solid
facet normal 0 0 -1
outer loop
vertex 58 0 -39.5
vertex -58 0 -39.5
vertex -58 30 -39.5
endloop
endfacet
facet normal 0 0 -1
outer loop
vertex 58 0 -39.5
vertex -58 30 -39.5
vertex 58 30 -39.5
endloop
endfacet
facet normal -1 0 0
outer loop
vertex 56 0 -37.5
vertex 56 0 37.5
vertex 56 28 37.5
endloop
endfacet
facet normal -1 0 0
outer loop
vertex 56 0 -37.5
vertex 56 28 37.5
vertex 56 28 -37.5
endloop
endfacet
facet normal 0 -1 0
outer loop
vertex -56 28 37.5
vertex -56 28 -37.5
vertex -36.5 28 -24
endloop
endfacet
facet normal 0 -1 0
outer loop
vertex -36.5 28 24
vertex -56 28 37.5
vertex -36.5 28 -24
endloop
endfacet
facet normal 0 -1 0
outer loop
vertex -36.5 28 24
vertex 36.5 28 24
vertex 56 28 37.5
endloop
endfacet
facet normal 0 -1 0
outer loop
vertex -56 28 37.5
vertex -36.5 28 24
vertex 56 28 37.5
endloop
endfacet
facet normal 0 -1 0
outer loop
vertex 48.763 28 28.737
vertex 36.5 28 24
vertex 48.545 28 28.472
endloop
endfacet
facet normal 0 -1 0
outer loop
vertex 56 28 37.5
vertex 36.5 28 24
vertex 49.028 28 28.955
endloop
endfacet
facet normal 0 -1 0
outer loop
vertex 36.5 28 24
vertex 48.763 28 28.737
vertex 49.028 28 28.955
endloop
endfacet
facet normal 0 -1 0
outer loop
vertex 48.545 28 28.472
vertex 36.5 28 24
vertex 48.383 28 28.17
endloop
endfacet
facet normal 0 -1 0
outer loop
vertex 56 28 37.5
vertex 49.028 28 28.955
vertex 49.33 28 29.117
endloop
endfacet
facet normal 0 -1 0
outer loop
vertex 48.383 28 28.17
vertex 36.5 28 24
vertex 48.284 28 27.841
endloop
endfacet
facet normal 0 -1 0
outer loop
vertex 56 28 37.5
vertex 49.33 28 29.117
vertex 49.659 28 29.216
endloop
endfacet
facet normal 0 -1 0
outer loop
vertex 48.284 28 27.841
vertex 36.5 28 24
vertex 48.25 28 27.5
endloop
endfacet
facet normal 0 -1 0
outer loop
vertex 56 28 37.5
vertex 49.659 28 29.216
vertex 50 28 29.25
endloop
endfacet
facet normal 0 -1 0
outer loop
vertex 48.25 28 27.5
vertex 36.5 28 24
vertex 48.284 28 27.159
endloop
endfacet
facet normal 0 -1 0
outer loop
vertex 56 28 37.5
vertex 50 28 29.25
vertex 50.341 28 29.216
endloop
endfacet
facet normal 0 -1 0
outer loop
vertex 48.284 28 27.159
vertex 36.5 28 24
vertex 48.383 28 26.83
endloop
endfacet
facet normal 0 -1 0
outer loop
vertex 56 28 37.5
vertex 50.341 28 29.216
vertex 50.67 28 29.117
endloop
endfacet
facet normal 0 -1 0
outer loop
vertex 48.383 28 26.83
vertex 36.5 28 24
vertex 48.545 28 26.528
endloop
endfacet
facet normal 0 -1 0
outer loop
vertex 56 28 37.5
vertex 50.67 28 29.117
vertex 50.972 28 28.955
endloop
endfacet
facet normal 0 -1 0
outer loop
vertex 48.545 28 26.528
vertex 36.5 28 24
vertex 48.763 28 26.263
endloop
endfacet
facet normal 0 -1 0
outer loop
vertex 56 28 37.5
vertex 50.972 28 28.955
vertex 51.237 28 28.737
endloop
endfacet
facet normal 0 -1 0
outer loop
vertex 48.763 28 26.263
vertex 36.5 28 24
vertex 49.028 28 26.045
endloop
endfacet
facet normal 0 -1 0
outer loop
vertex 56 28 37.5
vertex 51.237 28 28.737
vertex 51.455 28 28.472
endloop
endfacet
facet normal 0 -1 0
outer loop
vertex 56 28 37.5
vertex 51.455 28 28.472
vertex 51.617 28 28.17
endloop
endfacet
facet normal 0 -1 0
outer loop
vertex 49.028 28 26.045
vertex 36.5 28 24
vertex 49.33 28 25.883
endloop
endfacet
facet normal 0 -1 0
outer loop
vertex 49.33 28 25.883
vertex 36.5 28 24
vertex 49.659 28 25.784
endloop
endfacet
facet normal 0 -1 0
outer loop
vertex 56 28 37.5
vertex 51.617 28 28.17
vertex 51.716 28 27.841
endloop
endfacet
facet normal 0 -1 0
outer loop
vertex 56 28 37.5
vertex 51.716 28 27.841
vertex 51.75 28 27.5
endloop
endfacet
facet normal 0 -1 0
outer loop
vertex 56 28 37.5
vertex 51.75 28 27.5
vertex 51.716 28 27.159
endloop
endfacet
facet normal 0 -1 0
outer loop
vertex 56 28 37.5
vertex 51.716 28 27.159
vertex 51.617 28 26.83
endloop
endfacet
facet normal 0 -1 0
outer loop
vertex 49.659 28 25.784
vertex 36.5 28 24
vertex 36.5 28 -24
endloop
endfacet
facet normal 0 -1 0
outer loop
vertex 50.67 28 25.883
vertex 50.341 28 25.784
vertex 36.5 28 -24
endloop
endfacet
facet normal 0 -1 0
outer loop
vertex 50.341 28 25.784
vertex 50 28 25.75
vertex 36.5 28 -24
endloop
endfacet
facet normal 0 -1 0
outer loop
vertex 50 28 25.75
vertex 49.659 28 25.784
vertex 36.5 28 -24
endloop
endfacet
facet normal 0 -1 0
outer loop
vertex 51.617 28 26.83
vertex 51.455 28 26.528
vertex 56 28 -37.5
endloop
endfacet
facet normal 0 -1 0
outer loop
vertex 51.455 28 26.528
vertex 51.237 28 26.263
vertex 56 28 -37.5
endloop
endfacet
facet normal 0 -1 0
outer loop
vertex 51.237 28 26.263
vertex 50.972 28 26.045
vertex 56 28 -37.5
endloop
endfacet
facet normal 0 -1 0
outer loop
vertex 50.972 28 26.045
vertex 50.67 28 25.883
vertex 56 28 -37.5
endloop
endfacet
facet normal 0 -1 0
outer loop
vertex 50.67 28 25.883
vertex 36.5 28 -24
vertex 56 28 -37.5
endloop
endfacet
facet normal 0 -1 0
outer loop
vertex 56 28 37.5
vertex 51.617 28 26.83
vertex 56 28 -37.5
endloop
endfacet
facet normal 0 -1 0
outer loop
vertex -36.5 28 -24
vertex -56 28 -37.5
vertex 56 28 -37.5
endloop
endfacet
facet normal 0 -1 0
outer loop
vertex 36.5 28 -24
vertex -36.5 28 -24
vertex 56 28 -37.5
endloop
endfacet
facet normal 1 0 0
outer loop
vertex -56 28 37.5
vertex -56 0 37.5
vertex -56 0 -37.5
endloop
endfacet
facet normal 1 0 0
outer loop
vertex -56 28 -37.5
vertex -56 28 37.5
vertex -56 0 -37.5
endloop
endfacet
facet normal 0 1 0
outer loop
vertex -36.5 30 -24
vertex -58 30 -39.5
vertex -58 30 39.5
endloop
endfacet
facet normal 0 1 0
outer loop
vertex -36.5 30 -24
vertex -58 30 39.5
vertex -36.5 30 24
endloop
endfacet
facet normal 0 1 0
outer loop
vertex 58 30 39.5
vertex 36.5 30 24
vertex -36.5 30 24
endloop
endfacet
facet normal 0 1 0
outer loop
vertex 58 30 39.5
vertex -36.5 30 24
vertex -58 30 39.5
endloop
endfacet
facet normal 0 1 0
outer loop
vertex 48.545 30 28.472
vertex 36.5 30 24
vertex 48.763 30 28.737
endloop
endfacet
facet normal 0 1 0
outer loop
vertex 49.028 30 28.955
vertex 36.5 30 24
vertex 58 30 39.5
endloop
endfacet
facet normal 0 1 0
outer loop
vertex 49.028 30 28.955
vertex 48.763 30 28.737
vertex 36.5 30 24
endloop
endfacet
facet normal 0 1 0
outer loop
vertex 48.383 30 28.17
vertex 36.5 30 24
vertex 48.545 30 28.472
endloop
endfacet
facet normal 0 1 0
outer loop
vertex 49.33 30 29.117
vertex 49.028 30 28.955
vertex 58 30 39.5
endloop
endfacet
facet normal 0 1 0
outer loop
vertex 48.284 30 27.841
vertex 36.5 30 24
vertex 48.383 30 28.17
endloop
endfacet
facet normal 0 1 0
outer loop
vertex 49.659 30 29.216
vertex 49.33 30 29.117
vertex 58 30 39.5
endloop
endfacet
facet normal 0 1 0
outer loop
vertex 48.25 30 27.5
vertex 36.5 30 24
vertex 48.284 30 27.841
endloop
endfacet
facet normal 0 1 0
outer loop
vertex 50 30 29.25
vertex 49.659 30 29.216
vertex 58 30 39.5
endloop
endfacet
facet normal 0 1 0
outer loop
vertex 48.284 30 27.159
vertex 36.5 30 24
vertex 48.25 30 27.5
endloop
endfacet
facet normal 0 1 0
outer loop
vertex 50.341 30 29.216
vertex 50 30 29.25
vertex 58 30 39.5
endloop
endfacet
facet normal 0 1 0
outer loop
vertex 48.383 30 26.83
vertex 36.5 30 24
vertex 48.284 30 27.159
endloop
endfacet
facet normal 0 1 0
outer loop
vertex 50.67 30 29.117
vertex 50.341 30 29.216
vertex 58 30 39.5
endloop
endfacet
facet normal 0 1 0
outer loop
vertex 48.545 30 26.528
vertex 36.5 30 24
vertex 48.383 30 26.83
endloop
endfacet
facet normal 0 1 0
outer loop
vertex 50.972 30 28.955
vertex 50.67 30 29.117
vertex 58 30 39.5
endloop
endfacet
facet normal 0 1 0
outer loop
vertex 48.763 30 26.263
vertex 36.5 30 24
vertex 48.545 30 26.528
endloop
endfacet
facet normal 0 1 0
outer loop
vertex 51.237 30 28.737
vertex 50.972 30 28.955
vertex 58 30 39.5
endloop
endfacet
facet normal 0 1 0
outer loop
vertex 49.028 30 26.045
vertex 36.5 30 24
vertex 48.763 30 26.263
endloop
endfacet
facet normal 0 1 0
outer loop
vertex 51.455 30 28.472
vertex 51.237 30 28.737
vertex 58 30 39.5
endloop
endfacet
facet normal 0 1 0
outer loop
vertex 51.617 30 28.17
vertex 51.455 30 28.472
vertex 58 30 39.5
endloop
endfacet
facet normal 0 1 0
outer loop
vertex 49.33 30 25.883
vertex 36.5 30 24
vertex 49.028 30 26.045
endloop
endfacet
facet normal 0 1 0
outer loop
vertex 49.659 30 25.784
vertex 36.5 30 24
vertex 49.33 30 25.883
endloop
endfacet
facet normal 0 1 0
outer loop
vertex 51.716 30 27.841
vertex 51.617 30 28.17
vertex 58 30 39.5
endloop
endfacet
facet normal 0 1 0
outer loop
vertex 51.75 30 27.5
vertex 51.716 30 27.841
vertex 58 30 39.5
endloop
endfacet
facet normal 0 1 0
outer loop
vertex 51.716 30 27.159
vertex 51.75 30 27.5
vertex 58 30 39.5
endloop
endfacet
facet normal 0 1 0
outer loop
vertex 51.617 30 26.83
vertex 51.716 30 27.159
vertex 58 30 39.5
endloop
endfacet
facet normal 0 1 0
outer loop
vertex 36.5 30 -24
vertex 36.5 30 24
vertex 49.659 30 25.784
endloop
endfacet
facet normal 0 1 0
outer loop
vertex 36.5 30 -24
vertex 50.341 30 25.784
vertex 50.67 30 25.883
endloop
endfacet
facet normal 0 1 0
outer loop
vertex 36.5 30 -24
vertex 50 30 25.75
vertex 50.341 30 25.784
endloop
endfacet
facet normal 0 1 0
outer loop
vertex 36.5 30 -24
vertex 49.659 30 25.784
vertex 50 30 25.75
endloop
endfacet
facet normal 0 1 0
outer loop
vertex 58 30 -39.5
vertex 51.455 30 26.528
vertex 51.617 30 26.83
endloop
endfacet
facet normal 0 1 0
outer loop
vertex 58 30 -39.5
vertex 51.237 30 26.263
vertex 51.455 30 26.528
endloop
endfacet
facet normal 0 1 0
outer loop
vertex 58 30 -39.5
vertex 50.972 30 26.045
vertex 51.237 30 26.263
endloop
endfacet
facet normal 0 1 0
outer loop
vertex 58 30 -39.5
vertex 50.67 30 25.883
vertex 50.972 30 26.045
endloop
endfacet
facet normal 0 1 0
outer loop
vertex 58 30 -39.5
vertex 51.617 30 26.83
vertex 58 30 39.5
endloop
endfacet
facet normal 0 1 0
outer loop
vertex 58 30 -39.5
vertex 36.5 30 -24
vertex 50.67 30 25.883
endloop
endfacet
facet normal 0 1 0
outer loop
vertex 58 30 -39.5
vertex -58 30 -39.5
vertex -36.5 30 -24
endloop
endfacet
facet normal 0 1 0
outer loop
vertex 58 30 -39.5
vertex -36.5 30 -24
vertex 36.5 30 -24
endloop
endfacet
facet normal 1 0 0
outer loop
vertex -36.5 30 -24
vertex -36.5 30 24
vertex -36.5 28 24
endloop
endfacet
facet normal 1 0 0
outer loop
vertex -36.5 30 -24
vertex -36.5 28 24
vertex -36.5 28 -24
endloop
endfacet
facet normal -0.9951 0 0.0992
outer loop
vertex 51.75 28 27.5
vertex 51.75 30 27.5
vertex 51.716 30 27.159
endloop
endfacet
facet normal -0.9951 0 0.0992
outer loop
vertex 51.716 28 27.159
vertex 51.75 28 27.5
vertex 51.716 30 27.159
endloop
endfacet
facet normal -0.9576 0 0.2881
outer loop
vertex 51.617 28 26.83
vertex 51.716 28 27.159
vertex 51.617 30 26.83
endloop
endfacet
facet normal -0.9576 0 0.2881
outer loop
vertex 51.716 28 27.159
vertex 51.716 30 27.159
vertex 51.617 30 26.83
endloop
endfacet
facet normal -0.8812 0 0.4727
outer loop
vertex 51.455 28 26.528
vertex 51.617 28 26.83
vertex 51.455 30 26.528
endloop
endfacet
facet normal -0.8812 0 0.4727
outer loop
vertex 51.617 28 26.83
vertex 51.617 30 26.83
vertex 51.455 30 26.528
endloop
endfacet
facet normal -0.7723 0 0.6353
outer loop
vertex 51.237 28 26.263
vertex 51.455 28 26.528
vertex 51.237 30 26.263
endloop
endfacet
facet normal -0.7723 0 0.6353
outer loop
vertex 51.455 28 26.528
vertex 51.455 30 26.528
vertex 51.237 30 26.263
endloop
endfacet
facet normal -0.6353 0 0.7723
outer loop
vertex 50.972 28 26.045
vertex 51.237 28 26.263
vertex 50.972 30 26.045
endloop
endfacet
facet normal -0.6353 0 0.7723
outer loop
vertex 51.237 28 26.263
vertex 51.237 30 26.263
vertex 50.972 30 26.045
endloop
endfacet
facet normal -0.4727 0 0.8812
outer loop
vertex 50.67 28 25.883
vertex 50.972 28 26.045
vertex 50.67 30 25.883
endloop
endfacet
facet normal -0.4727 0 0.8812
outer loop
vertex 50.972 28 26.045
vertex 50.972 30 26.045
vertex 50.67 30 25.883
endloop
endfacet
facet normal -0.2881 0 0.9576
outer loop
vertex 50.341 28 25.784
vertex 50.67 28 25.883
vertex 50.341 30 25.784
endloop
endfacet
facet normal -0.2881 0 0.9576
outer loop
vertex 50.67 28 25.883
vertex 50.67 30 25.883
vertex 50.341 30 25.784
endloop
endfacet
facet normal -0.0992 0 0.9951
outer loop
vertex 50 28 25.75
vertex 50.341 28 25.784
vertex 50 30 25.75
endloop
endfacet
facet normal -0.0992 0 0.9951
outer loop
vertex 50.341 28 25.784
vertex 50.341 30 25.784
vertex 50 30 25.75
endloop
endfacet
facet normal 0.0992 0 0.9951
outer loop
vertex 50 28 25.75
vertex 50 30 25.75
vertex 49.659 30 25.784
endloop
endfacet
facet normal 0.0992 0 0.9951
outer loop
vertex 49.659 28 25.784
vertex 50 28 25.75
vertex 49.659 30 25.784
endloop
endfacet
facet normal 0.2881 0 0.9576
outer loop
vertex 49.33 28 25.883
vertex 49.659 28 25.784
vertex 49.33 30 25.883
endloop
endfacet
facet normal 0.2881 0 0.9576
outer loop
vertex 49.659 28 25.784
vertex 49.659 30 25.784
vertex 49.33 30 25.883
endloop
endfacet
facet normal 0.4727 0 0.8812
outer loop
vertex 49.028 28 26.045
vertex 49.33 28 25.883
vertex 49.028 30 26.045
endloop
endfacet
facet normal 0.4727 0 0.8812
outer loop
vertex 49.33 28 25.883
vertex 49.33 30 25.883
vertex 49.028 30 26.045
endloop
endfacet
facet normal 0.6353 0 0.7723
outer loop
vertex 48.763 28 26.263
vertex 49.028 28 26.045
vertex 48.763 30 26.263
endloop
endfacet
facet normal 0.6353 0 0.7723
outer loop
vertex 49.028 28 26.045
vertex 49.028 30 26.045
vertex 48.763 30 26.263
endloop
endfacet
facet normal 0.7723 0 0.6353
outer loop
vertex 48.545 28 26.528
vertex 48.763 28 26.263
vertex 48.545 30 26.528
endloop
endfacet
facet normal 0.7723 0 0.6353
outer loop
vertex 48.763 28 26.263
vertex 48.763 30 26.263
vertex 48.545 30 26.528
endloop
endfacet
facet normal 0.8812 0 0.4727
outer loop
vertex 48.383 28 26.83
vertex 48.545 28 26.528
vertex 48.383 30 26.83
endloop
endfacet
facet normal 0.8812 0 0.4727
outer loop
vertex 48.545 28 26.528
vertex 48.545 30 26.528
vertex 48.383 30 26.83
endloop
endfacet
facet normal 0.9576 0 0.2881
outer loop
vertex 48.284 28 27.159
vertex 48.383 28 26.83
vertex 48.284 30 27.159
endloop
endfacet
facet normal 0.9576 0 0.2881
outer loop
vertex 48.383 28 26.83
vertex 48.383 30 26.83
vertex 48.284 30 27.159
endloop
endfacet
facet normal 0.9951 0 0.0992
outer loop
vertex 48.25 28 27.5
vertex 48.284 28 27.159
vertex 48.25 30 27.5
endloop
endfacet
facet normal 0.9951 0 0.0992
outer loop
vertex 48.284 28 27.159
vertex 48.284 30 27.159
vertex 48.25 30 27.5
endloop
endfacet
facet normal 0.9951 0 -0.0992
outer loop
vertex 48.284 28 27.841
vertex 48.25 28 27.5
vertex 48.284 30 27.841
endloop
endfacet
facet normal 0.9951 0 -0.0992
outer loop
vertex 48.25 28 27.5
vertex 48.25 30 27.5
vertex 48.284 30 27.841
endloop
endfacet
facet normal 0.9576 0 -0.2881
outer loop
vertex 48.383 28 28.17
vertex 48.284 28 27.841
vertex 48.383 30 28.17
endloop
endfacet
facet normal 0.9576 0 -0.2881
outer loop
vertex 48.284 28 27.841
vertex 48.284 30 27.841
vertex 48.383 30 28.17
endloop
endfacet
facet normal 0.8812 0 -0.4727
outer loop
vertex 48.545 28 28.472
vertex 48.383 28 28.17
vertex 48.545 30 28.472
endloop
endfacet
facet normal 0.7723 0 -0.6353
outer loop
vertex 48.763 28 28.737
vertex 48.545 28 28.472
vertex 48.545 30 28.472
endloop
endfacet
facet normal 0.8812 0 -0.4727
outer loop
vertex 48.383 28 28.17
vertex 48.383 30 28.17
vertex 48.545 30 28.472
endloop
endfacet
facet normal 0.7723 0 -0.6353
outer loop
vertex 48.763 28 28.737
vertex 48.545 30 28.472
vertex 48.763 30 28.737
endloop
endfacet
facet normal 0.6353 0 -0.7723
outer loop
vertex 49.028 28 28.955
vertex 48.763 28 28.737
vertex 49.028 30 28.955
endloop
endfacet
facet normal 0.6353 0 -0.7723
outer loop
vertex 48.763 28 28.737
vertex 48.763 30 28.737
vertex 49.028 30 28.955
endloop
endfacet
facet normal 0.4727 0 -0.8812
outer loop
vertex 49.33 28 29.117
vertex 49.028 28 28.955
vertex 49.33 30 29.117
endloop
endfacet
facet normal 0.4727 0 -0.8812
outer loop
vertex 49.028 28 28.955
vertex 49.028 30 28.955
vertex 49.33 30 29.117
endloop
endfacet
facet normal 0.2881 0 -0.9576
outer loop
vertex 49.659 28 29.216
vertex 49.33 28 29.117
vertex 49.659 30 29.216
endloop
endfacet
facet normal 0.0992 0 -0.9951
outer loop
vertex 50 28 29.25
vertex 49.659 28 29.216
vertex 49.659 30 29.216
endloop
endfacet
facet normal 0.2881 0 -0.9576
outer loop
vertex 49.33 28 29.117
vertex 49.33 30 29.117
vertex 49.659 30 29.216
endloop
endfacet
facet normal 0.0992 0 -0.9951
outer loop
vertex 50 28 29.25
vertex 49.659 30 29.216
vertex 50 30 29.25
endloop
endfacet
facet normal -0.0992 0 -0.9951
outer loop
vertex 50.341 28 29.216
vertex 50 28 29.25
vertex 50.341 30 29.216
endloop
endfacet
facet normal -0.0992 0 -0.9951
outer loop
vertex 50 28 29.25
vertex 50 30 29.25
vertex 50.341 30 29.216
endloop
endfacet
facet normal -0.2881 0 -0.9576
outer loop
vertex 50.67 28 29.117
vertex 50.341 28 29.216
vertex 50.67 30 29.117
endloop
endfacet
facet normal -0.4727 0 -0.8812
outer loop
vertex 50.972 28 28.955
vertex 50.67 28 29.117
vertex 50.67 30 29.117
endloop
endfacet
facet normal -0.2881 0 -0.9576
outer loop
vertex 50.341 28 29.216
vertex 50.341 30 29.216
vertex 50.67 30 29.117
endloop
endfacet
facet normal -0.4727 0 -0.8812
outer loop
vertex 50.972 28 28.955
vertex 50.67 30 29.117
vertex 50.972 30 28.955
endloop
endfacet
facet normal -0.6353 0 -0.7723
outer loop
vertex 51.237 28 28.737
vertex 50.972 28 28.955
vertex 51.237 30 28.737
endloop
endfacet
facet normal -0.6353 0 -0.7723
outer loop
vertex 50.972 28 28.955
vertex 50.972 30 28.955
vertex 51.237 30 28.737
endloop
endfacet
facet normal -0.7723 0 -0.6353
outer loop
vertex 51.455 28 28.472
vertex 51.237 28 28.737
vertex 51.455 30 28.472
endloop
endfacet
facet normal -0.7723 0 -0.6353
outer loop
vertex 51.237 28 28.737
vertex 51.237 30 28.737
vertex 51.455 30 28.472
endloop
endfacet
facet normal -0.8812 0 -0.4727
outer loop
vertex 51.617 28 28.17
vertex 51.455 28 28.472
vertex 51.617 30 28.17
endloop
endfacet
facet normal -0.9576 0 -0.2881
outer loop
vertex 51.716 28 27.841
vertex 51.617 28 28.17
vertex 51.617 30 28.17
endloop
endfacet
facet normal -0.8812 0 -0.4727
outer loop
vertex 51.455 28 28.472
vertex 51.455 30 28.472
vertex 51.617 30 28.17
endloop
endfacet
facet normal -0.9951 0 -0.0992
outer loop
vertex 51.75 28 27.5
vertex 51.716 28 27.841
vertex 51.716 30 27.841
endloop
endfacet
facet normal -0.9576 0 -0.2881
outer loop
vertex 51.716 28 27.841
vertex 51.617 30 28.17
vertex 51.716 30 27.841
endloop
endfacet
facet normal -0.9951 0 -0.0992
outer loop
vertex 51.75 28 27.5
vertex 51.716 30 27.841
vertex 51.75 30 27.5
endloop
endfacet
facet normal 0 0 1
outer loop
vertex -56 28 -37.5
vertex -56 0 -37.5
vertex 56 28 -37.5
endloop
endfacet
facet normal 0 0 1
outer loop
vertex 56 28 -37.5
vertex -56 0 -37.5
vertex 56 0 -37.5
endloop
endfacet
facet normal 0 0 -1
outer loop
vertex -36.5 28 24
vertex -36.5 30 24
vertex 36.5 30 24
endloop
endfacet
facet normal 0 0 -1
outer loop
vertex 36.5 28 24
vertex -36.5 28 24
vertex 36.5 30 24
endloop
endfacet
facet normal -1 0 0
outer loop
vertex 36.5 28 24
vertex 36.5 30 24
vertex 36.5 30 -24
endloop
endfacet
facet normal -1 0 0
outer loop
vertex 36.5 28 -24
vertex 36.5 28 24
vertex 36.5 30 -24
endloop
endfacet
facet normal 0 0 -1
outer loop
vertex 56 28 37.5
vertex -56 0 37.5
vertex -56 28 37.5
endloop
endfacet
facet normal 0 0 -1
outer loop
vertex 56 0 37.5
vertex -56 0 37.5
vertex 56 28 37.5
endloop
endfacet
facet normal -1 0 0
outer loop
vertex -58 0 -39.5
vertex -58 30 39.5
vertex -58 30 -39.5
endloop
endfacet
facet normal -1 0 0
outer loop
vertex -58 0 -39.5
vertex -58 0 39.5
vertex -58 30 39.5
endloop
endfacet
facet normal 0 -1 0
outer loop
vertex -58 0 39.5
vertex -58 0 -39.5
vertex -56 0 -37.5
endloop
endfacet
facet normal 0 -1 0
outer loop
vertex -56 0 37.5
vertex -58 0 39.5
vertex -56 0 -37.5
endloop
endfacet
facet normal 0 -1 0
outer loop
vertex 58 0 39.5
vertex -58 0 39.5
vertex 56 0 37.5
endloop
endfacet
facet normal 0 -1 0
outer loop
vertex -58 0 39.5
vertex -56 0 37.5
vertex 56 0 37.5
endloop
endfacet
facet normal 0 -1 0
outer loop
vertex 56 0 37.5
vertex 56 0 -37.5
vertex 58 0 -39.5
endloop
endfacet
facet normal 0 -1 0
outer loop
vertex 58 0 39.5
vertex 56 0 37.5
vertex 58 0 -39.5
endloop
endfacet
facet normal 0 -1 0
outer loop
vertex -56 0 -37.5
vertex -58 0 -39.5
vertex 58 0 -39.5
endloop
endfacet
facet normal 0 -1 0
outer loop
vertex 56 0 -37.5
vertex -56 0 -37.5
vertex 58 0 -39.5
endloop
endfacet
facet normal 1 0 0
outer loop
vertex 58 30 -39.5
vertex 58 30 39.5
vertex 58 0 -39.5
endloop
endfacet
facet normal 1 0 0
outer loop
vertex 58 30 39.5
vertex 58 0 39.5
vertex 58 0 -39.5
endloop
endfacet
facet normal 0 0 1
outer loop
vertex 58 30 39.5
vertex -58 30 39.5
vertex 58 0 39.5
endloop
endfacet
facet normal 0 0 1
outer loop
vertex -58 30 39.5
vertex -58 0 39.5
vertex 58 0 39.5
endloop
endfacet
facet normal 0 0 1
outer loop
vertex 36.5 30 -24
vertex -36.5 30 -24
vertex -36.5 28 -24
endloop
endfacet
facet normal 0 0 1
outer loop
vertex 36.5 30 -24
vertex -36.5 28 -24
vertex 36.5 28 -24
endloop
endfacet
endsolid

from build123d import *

# Parameters (mm, degrees)
SKETCH1_W           = 116
SKETCH1_H           = 79
SKETCH1_W_2         = 112
SKETCH1_H_2         = 75
BOSS_EXTRUDE1_DEPTH = 28
SKETCH2_W           = 116
SKETCH2_H           = 79
BOSS_EXTRUDE2_DEPTH = 2
SKETCH3_W           = 73
SKETCH3_H           = 48
CUT_EXTRUDE1_DEPTH  = 2
SKETCH4_R           = 1.75
CUT_EXTRUDE2_DEPTH  = 2


with BuildPart() as part:
    # Sketch1 → Boss-Extrude1 (new body)
    with BuildSketch(Plane(origin=(0, 0, 0), x_dir=(1, 0, 0), z_dir=(0, 1, 0))):
        Rectangle(SKETCH1_W, SKETCH1_H)
        Rectangle(SKETCH1_W_2, SKETCH1_H_2, mode=Mode.SUBTRACT)
    extrude(amount=BOSS_EXTRUDE1_DEPTH)

    # Sketch2 → Boss-Extrude2 (add)
    with BuildSketch(Plane(origin=(0, 28, 0), x_dir=(1, 0, 0), z_dir=(0, 1, 0))):
        Rectangle(SKETCH2_W, SKETCH2_H)
    extrude(amount=BOSS_EXTRUDE2_DEPTH)

    # Sketch3 → Cut-Extrude1 (cut)
    with BuildSketch(Plane(origin=(0, 30, 0), x_dir=(1, 0, 0), z_dir=(0, 1, 0))):
        Rectangle(SKETCH3_W, SKETCH3_H)
    extrude(amount=-CUT_EXTRUDE1_DEPTH, mode=Mode.SUBTRACT)

    # Sketch4 → Cut-Extrude2 (cut)
    with BuildSketch(Plane(origin=(0, 30, 0), x_dir=(1, 0, 0), z_dir=(0, 1, 0))):
        with Locations((50, -27.5)):
            Circle(SKETCH4_R)
    extrude(amount=-CUT_EXTRUDE2_DEPTH, mode=Mode.SUBTRACT)


solid = part.part
